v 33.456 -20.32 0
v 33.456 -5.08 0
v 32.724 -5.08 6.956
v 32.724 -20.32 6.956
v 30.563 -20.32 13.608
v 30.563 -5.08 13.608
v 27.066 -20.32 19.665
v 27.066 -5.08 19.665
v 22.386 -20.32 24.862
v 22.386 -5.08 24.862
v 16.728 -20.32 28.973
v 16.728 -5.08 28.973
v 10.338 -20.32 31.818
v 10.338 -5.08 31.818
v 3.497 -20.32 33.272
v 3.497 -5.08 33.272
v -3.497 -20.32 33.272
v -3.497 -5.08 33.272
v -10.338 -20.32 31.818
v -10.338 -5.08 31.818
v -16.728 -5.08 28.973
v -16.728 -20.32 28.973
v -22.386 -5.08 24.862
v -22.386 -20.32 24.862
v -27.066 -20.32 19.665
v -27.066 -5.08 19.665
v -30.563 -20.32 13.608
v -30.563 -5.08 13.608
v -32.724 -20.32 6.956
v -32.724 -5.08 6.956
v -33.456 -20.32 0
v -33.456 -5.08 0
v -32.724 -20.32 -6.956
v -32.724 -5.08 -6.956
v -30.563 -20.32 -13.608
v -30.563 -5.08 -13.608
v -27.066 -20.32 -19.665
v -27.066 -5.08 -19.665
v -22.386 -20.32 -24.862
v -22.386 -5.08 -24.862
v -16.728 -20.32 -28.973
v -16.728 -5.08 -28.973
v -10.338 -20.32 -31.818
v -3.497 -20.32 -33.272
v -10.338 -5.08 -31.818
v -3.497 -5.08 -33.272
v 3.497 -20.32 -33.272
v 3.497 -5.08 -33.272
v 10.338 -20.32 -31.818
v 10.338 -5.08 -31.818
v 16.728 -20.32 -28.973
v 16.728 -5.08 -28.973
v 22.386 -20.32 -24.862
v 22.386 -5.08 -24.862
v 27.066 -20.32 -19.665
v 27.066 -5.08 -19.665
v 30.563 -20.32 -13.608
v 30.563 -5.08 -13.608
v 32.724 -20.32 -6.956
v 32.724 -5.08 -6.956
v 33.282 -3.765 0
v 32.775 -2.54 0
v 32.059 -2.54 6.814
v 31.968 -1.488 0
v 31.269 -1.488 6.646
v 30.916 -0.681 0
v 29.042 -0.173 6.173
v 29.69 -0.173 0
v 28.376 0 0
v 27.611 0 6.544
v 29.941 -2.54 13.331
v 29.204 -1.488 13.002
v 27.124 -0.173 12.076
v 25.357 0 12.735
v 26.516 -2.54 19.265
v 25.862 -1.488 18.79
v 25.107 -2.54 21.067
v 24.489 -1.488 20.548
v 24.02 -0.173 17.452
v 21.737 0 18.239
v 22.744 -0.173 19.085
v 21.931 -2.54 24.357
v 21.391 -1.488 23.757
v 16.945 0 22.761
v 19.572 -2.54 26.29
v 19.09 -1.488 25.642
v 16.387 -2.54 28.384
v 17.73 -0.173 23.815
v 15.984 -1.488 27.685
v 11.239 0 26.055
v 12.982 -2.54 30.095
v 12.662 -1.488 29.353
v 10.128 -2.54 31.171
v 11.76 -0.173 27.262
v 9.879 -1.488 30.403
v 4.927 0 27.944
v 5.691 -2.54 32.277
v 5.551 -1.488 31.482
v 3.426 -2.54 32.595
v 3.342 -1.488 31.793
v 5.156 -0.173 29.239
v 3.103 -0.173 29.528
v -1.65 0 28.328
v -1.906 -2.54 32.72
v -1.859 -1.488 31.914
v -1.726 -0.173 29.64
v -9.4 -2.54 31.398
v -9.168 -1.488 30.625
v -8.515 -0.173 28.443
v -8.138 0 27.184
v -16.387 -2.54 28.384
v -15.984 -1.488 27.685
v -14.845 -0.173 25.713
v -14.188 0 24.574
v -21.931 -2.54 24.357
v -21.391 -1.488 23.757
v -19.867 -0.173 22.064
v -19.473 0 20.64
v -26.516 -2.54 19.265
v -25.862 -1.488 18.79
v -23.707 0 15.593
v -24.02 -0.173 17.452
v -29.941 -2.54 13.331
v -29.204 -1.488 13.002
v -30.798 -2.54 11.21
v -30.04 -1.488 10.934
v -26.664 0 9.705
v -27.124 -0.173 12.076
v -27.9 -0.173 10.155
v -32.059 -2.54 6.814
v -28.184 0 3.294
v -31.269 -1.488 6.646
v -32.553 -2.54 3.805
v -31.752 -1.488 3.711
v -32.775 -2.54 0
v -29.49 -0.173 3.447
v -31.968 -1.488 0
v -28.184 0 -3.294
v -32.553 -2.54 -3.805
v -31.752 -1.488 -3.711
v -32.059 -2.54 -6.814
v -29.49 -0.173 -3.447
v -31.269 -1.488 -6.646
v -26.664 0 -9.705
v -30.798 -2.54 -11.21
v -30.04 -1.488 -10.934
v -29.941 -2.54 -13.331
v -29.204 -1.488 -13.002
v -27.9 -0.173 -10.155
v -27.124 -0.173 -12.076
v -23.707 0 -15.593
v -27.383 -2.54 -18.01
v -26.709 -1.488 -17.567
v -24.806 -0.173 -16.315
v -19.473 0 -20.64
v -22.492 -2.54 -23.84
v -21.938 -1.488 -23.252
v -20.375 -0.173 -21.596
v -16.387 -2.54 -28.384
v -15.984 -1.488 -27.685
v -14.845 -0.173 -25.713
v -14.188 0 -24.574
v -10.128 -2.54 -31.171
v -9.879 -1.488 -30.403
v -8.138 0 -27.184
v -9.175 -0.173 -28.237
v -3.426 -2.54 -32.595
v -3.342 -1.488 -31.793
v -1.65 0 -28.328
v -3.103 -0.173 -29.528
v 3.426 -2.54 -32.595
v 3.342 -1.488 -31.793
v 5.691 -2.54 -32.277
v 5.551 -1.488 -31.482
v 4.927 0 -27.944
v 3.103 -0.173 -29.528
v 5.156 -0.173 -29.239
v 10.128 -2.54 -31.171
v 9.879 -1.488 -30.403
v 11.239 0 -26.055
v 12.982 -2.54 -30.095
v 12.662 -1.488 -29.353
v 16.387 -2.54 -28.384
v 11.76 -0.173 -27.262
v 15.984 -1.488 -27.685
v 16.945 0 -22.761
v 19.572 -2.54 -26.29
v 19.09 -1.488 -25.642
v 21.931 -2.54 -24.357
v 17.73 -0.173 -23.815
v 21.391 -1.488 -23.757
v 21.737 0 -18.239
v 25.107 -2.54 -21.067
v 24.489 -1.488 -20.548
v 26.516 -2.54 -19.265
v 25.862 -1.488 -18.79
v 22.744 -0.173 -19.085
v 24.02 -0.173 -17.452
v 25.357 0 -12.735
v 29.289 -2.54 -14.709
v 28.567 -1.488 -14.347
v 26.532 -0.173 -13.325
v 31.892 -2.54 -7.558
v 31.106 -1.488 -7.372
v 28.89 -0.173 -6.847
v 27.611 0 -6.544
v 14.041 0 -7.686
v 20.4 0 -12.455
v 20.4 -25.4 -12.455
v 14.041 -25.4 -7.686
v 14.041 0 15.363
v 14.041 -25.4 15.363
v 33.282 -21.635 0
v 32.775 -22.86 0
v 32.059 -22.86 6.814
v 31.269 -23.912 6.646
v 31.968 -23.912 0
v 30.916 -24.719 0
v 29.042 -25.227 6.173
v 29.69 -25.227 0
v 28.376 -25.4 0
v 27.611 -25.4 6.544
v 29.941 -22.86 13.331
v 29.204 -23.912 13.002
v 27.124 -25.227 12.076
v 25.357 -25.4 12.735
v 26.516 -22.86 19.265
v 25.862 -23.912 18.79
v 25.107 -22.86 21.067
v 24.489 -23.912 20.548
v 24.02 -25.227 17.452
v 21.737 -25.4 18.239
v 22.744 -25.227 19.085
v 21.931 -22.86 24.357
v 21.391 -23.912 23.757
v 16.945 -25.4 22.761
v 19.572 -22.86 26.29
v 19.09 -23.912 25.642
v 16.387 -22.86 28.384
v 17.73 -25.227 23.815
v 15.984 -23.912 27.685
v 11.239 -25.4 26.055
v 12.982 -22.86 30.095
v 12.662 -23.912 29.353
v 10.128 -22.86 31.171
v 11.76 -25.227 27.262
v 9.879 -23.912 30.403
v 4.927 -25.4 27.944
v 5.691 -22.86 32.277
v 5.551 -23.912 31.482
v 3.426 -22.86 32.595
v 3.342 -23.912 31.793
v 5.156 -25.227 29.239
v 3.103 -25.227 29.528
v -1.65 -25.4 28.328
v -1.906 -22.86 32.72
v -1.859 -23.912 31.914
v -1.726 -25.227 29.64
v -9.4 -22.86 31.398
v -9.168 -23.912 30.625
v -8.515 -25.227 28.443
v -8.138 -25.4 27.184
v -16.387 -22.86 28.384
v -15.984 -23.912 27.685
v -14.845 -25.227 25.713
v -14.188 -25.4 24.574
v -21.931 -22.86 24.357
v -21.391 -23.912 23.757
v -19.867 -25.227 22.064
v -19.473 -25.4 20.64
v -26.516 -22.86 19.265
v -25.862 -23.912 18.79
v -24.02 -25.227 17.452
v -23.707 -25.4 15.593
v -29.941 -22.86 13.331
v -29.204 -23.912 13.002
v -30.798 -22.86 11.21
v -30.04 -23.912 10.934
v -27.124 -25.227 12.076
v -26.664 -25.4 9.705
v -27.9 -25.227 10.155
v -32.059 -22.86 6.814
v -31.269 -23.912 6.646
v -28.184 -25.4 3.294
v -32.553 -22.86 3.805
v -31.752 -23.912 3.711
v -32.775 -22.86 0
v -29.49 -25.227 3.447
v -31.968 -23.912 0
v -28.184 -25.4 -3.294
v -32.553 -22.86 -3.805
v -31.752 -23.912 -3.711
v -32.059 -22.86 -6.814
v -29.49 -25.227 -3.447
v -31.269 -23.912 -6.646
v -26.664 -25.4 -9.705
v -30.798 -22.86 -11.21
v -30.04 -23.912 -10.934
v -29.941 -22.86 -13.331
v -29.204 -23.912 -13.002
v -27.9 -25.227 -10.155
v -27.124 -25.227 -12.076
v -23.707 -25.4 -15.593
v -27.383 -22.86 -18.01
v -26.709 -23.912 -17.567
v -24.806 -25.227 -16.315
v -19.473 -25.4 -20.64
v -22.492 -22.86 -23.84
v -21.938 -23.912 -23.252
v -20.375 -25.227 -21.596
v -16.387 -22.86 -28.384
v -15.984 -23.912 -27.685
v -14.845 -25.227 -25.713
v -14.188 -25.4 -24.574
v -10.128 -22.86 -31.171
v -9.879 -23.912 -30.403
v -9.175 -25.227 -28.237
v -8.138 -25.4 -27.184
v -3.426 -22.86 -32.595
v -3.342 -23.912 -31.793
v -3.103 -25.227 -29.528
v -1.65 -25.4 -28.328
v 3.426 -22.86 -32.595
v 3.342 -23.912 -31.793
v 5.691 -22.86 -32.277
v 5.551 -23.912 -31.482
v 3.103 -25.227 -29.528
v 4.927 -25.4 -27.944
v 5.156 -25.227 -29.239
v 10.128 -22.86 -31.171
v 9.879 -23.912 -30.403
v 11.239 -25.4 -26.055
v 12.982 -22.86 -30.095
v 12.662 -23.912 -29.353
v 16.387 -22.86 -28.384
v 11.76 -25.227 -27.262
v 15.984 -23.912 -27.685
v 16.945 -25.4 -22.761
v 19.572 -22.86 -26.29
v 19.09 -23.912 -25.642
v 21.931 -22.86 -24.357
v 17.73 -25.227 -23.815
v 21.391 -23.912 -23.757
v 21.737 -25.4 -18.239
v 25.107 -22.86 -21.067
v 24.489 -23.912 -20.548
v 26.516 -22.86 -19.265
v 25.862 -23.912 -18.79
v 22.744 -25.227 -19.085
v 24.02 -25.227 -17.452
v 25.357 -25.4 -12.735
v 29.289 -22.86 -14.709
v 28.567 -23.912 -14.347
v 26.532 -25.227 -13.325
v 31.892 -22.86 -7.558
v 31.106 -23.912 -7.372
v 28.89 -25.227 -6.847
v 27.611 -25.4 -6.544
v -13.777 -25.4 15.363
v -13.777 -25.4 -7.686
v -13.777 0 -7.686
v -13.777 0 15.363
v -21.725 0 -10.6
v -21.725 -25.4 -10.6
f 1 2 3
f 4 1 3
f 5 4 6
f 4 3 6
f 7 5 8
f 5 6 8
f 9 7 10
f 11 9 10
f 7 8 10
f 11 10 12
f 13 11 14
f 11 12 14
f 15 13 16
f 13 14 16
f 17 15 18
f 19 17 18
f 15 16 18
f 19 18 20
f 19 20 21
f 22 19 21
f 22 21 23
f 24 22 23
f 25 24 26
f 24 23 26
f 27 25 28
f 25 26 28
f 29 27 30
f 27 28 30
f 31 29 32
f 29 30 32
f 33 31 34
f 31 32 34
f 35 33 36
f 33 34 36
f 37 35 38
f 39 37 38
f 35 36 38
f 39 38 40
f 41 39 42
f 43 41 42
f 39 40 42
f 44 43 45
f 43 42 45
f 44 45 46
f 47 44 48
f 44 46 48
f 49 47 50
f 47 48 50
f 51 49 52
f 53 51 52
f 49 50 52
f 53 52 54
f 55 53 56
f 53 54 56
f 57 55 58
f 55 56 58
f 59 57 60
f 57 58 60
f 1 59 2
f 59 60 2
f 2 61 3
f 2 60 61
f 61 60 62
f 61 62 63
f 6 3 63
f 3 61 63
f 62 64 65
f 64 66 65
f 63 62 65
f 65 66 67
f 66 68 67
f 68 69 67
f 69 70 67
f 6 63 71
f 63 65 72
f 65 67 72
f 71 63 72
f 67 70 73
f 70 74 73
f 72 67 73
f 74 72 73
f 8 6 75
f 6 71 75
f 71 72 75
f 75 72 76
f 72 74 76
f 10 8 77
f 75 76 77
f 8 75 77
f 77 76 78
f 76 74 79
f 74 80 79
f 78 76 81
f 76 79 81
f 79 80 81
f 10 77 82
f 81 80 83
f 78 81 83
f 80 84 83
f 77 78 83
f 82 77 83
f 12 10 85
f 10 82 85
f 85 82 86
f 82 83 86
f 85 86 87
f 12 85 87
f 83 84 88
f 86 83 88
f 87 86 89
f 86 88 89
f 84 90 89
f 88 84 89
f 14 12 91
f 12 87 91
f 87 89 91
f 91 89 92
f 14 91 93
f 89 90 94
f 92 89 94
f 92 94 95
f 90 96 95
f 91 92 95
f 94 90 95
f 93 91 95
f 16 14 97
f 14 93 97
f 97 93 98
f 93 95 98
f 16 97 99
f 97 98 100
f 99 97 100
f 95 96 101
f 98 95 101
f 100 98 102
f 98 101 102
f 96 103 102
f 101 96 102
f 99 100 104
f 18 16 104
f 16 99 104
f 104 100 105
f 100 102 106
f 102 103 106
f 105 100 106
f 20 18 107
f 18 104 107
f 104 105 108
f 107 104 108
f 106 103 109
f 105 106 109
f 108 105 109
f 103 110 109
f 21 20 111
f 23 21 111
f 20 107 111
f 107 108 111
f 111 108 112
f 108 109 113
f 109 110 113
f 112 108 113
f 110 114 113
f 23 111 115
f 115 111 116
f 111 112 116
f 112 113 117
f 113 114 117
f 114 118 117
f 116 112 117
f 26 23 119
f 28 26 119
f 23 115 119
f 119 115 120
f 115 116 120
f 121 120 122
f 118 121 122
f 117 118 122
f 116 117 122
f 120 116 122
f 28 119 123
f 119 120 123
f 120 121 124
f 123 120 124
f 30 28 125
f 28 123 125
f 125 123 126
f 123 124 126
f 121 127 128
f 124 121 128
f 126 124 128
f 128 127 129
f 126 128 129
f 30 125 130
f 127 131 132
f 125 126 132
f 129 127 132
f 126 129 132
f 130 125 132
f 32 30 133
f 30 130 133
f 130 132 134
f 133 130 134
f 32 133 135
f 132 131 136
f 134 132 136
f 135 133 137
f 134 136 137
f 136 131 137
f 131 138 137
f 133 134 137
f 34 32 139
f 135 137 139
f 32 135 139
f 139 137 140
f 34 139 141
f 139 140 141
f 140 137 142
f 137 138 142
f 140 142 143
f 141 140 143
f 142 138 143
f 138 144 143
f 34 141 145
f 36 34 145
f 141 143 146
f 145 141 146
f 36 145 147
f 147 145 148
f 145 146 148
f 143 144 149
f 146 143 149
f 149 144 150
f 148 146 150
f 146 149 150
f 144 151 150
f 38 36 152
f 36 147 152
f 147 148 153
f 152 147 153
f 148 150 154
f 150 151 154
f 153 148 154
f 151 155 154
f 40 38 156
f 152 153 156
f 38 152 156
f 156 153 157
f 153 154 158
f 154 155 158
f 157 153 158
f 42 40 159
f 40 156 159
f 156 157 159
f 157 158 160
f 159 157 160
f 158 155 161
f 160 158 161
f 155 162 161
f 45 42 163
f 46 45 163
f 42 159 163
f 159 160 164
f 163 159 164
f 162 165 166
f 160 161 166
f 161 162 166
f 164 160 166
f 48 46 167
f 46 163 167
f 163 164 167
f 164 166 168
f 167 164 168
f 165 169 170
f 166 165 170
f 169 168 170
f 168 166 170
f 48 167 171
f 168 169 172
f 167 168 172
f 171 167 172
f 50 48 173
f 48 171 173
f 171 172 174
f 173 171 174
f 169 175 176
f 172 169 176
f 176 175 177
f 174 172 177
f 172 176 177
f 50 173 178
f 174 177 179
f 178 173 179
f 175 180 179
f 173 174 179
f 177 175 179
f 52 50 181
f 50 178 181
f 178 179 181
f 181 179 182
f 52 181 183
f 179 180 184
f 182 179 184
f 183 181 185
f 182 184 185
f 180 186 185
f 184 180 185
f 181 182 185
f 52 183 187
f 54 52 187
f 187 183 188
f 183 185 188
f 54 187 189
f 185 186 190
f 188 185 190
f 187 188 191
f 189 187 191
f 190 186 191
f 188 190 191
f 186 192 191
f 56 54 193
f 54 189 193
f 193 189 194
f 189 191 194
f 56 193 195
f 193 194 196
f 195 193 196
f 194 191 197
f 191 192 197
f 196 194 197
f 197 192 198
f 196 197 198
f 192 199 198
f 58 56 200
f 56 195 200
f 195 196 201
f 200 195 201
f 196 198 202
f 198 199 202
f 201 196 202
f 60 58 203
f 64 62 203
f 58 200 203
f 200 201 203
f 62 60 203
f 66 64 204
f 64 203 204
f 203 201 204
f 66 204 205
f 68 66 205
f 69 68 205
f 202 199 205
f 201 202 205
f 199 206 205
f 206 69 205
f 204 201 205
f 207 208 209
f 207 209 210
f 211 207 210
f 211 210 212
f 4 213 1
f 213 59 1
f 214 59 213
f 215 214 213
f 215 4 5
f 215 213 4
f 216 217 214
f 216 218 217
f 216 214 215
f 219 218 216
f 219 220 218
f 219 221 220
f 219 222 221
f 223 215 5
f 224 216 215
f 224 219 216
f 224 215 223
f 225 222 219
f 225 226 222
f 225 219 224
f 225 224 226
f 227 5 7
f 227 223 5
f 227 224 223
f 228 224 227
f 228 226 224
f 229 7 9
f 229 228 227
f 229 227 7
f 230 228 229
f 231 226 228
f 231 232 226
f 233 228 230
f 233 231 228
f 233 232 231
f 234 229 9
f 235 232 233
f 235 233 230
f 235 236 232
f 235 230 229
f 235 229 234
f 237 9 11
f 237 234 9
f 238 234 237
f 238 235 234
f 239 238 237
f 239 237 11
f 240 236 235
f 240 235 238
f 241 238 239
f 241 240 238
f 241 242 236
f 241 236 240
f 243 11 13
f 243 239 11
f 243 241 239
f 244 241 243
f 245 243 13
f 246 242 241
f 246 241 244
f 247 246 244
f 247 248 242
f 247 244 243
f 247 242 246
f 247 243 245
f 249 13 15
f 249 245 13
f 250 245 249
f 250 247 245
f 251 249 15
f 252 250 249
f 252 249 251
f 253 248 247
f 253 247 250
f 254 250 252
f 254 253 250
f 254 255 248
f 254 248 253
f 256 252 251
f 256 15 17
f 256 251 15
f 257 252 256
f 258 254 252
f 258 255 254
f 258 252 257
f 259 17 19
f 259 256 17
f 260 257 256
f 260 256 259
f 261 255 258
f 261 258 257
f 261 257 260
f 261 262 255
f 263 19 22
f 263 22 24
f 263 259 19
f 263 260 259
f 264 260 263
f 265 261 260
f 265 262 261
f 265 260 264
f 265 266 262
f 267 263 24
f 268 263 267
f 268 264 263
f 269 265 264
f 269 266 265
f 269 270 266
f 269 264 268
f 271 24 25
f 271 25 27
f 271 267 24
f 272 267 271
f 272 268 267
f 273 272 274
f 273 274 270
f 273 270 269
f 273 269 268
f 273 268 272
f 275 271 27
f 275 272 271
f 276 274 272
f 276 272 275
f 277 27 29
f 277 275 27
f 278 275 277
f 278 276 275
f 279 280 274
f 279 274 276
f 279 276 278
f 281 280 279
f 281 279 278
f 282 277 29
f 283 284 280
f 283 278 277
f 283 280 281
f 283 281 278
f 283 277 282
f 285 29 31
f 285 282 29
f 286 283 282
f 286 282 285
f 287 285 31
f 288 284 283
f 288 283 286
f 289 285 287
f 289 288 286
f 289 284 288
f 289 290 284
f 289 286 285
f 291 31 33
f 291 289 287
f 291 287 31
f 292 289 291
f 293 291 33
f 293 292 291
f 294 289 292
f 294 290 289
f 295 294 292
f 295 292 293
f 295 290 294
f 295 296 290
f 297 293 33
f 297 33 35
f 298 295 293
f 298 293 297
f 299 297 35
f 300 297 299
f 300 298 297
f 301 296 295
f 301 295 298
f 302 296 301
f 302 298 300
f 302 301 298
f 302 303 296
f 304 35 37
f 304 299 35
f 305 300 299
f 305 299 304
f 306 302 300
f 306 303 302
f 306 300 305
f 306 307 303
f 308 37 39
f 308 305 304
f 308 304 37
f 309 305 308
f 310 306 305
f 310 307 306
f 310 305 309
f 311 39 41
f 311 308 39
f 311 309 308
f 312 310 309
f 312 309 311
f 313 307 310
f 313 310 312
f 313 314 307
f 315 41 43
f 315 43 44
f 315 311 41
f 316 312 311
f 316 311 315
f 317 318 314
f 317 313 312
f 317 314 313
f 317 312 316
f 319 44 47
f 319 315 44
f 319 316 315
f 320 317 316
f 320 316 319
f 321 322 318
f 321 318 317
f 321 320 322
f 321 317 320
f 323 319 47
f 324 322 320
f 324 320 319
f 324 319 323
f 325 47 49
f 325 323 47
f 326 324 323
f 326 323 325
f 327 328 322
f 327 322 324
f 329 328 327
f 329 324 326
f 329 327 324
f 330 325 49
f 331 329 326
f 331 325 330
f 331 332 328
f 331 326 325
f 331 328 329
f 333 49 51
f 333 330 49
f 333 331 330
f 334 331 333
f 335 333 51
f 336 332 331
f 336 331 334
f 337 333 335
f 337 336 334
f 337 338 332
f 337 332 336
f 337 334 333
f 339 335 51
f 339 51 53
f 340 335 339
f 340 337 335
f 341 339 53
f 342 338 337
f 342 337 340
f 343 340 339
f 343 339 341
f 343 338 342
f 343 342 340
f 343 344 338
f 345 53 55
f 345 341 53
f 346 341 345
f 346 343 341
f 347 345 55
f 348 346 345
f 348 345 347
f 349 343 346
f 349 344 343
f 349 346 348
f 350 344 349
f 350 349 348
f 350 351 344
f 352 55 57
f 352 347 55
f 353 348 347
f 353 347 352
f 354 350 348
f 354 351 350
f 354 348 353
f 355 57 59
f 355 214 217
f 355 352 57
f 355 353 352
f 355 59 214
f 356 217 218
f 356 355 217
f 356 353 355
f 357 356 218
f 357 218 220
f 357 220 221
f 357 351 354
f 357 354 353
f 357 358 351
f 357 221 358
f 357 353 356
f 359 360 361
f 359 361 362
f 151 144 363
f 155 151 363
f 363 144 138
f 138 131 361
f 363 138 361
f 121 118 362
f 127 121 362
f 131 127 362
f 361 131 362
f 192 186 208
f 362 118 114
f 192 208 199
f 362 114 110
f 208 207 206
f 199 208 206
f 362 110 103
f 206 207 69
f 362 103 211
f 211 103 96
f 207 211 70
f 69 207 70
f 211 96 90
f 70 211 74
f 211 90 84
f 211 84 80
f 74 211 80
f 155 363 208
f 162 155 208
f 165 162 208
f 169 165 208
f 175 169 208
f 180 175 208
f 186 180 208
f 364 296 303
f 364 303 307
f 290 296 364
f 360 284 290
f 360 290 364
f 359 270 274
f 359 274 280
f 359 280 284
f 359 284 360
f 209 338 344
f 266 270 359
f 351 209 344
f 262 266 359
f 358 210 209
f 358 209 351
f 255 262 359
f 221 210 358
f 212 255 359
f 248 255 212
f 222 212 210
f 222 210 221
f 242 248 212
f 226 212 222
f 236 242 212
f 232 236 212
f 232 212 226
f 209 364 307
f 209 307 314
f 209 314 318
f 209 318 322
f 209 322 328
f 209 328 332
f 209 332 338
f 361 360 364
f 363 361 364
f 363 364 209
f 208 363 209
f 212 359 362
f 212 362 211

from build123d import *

# Parameters (mm, degrees)
F0_R     = 33.455584
F1_DEPTH = 25.4
F2_R     = 5.08
F3_R     = 5.08
F4_W     = 27.818047
F4_H     = 23.049239
F5_DEPTH = 25.401
F7_DEPTH = 25.401


with BuildPart() as f1:
    # F0 (on Front) → F1 (new body)
    with BuildSketch(Plane.XZ):
        Circle(F0_R)
    extrude(amount=F1_DEPTH)

    # F2
    f2_edges = [f1.edges().sort_by_distance(p)[0] for p in [
        (-33.455584, -25.4, 0),
    ]]
    fillet(f2_edges, radius=F2_R)

    # F3
    f3_edges = [f1.edges().sort_by_distance(p)[0] for p in [
        (-33.455584, 0, 0),
    ]]
    fillet(f3_edges, radius=F3_R)

    # F4 (on face) → F5 (cut, through all)
    with BuildSketch(Plane.XZ.offset(25.4)):
        with Locations((0.132467, 3.83878)):
            Rectangle(F4_W, F4_H)
    extrude(amount=-F5_DEPTH, mode=Mode.SUBTRACT)

    # F6 (on face) → F7 (cut, through all)
    with BuildSketch(Plane.XZ.offset(25.4)):
        Polygon((-13.776556, -7.685839), (-21.724571, -10.60011), (20.3999, -12.454647), (14.041491, -7.685839), align=None)
    extrude(amount=-F7_DEPTH, mode=Mode.SUBTRACT)


solid = f1.part
